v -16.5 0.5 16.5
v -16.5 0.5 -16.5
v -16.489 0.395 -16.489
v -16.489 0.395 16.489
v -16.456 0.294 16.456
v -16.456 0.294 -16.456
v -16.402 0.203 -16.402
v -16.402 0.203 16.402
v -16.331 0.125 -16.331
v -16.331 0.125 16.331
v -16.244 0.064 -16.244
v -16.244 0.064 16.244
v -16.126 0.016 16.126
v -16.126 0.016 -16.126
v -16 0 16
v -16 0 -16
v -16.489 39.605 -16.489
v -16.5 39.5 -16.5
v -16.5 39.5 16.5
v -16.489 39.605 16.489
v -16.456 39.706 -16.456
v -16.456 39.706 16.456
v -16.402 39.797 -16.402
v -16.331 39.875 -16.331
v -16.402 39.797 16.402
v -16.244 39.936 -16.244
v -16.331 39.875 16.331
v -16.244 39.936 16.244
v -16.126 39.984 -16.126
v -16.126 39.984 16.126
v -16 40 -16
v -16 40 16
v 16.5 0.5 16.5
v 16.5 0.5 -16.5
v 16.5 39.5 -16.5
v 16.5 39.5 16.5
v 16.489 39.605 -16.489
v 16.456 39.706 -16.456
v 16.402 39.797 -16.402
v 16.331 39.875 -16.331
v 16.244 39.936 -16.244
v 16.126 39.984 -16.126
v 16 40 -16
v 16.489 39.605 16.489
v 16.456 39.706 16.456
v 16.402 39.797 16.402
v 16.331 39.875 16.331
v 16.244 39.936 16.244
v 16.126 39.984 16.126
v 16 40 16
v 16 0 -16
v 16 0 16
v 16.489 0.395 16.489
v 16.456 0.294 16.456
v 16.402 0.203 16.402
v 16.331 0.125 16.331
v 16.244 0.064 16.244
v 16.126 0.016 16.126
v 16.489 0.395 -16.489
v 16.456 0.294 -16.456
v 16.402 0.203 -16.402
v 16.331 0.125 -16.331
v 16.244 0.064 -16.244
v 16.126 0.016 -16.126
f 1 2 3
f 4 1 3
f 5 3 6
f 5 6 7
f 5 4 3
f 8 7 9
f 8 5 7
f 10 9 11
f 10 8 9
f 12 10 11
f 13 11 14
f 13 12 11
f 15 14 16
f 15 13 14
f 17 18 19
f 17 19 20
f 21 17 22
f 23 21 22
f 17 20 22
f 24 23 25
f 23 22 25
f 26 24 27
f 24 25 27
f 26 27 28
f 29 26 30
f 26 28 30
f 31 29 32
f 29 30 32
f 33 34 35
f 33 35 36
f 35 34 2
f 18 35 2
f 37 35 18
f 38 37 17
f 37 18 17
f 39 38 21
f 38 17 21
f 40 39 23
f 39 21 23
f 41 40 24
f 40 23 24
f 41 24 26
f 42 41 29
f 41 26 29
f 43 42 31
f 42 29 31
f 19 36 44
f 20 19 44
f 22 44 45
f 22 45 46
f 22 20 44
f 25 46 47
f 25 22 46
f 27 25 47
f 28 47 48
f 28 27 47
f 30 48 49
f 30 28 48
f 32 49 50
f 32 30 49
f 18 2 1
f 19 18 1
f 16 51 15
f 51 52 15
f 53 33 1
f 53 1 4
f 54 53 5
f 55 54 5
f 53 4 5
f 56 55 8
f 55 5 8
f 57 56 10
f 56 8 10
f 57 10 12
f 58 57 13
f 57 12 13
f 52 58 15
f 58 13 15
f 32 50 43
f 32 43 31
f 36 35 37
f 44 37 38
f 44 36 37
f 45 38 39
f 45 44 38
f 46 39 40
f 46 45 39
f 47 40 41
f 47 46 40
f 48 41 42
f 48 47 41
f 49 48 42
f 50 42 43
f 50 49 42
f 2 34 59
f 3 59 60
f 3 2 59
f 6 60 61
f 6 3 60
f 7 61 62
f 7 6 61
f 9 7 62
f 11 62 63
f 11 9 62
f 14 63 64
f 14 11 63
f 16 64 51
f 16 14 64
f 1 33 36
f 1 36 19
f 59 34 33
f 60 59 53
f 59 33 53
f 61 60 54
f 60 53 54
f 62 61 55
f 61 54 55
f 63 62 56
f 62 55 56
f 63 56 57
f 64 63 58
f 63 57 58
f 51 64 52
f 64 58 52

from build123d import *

# Parameters (mm, degrees)
SKETCH1_W           = 33
SKETCH1_H           = 33
BOSS_EXTRUDE1_DEPTH = 40
FILLET1_R           = 0.5


with BuildPart() as part:
    # Sketch1 → Boss-Extrude1 (new body)
    with BuildSketch(Plane(origin=(0, 0, 0), x_dir=(-1, 0, 0), z_dir=(0, 1, 0))):
        with Locations((-8.9e-08, -2.9e-07)):
            Rectangle(SKETCH1_W, SKETCH1_H)
    extrude(amount=BOSS_EXTRUDE1_DEPTH)

    # Fillet1
    fillet1_edges = [part.edges().sort_by_distance(p)[0] for p in [
        (16.500000089, 40, -2.9e-07),
        (8.9e-08, 40, -16.50000029),
        (-16.499999911, 40, -2.9e-07),
        (8.9e-08, 0, -16.50000029),
        (16.500000089, 0, -2.9e-07),
        (8.9e-08, 0, 16.49999971),
        (-16.499999911, 0, -2.9e-07),
        (8.9e-08, 40, 16.49999971),
    ]]
    fillet(fillet1_edges, radius=FILLET1_R)


solid = part.part
